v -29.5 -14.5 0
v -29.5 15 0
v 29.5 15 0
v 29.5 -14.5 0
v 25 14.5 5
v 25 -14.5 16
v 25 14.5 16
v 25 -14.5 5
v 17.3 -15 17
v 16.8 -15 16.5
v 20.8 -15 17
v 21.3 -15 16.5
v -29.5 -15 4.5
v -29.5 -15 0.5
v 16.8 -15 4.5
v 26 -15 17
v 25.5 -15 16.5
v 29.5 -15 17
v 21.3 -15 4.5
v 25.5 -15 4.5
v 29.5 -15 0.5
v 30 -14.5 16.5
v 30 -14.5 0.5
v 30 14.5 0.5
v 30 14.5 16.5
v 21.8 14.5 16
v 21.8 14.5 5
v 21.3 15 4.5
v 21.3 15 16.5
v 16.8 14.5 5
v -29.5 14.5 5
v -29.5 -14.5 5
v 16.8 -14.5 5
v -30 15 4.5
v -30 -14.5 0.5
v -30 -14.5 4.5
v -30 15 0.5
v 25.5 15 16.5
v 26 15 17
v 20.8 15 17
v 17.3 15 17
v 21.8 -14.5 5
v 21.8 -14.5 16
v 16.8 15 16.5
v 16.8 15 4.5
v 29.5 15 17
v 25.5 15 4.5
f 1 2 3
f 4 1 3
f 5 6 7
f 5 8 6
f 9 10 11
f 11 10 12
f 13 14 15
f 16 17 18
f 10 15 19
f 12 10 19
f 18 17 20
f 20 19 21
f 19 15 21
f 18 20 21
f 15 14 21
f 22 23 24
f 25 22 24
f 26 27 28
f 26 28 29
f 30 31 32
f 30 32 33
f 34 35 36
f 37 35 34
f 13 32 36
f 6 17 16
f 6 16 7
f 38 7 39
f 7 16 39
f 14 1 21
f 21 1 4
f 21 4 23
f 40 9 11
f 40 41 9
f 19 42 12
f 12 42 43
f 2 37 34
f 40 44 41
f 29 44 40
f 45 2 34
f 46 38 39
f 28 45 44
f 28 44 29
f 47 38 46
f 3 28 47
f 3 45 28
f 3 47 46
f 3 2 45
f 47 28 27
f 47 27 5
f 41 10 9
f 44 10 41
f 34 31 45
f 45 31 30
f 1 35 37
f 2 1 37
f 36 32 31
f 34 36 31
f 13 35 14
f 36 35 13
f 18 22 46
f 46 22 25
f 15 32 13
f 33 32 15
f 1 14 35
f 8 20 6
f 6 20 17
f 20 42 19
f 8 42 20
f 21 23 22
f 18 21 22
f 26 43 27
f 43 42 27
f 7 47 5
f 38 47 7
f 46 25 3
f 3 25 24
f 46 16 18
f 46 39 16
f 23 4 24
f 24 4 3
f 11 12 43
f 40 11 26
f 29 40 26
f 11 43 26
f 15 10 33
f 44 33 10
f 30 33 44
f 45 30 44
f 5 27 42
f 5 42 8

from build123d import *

# Parameters (mm, degrees)
F0_W     = 60
F0_H     = 30
F1_DEPTH = 5
F2_W     = 5
F2_H     = 30
F3_DEPTH = 12
F4_SIZE  = 1
F5_SIZE  = 0.5


with BuildPart() as f1:
    # F0 (on Top) → F1 (new body)
    with BuildSketch(Plane.XY):
        Rectangle(F0_W, F0_H)
    extrude(amount=F1_DEPTH)

    # F2 (on face) → F3 (join)
    with BuildSketch(Plane.XY.offset(5)):
        with Locations((19.3, 0)):
            Rectangle(F2_W, F2_H)
        with Locations((27.5, 0)):
            Rectangle(F2_W, F2_H)
    extrude(amount=F3_DEPTH)

    # F4
    f4_edges = [f1.edges().sort_by_distance(p)[0] for p in [
        (21.8, 0, 17),
        (25, 0, 17),
    ]]
    chamfer(f4_edges, length=F4_SIZE)

    # F5
    f5_edges = [f1.edges().sort_by_distance(p)[0] for p in [
        (-6.6, -15, 5),
        (-30, 0, 5),
        (-6.6, 15, 5),
        (-30, -15, 2.5),
        (0, -15, 0),
        (23.4, -15, 5),
        (30, 0, 0),
        (16.8, 0, 17),
        (30, 0, 17),
        (-30, 0, 0),
        (30, -15, 8.5),
        (30, 15, 8.5),
        (23.4, 15, 5),
        (21.8, 15, 10.5),
        (25, 15, 10.5),
        (25, -15, 10.5),
        (21.8, -15, 10.5),
    ]]
    chamfer(f5_edges, length=F5_SIZE)


solid = f1.part
